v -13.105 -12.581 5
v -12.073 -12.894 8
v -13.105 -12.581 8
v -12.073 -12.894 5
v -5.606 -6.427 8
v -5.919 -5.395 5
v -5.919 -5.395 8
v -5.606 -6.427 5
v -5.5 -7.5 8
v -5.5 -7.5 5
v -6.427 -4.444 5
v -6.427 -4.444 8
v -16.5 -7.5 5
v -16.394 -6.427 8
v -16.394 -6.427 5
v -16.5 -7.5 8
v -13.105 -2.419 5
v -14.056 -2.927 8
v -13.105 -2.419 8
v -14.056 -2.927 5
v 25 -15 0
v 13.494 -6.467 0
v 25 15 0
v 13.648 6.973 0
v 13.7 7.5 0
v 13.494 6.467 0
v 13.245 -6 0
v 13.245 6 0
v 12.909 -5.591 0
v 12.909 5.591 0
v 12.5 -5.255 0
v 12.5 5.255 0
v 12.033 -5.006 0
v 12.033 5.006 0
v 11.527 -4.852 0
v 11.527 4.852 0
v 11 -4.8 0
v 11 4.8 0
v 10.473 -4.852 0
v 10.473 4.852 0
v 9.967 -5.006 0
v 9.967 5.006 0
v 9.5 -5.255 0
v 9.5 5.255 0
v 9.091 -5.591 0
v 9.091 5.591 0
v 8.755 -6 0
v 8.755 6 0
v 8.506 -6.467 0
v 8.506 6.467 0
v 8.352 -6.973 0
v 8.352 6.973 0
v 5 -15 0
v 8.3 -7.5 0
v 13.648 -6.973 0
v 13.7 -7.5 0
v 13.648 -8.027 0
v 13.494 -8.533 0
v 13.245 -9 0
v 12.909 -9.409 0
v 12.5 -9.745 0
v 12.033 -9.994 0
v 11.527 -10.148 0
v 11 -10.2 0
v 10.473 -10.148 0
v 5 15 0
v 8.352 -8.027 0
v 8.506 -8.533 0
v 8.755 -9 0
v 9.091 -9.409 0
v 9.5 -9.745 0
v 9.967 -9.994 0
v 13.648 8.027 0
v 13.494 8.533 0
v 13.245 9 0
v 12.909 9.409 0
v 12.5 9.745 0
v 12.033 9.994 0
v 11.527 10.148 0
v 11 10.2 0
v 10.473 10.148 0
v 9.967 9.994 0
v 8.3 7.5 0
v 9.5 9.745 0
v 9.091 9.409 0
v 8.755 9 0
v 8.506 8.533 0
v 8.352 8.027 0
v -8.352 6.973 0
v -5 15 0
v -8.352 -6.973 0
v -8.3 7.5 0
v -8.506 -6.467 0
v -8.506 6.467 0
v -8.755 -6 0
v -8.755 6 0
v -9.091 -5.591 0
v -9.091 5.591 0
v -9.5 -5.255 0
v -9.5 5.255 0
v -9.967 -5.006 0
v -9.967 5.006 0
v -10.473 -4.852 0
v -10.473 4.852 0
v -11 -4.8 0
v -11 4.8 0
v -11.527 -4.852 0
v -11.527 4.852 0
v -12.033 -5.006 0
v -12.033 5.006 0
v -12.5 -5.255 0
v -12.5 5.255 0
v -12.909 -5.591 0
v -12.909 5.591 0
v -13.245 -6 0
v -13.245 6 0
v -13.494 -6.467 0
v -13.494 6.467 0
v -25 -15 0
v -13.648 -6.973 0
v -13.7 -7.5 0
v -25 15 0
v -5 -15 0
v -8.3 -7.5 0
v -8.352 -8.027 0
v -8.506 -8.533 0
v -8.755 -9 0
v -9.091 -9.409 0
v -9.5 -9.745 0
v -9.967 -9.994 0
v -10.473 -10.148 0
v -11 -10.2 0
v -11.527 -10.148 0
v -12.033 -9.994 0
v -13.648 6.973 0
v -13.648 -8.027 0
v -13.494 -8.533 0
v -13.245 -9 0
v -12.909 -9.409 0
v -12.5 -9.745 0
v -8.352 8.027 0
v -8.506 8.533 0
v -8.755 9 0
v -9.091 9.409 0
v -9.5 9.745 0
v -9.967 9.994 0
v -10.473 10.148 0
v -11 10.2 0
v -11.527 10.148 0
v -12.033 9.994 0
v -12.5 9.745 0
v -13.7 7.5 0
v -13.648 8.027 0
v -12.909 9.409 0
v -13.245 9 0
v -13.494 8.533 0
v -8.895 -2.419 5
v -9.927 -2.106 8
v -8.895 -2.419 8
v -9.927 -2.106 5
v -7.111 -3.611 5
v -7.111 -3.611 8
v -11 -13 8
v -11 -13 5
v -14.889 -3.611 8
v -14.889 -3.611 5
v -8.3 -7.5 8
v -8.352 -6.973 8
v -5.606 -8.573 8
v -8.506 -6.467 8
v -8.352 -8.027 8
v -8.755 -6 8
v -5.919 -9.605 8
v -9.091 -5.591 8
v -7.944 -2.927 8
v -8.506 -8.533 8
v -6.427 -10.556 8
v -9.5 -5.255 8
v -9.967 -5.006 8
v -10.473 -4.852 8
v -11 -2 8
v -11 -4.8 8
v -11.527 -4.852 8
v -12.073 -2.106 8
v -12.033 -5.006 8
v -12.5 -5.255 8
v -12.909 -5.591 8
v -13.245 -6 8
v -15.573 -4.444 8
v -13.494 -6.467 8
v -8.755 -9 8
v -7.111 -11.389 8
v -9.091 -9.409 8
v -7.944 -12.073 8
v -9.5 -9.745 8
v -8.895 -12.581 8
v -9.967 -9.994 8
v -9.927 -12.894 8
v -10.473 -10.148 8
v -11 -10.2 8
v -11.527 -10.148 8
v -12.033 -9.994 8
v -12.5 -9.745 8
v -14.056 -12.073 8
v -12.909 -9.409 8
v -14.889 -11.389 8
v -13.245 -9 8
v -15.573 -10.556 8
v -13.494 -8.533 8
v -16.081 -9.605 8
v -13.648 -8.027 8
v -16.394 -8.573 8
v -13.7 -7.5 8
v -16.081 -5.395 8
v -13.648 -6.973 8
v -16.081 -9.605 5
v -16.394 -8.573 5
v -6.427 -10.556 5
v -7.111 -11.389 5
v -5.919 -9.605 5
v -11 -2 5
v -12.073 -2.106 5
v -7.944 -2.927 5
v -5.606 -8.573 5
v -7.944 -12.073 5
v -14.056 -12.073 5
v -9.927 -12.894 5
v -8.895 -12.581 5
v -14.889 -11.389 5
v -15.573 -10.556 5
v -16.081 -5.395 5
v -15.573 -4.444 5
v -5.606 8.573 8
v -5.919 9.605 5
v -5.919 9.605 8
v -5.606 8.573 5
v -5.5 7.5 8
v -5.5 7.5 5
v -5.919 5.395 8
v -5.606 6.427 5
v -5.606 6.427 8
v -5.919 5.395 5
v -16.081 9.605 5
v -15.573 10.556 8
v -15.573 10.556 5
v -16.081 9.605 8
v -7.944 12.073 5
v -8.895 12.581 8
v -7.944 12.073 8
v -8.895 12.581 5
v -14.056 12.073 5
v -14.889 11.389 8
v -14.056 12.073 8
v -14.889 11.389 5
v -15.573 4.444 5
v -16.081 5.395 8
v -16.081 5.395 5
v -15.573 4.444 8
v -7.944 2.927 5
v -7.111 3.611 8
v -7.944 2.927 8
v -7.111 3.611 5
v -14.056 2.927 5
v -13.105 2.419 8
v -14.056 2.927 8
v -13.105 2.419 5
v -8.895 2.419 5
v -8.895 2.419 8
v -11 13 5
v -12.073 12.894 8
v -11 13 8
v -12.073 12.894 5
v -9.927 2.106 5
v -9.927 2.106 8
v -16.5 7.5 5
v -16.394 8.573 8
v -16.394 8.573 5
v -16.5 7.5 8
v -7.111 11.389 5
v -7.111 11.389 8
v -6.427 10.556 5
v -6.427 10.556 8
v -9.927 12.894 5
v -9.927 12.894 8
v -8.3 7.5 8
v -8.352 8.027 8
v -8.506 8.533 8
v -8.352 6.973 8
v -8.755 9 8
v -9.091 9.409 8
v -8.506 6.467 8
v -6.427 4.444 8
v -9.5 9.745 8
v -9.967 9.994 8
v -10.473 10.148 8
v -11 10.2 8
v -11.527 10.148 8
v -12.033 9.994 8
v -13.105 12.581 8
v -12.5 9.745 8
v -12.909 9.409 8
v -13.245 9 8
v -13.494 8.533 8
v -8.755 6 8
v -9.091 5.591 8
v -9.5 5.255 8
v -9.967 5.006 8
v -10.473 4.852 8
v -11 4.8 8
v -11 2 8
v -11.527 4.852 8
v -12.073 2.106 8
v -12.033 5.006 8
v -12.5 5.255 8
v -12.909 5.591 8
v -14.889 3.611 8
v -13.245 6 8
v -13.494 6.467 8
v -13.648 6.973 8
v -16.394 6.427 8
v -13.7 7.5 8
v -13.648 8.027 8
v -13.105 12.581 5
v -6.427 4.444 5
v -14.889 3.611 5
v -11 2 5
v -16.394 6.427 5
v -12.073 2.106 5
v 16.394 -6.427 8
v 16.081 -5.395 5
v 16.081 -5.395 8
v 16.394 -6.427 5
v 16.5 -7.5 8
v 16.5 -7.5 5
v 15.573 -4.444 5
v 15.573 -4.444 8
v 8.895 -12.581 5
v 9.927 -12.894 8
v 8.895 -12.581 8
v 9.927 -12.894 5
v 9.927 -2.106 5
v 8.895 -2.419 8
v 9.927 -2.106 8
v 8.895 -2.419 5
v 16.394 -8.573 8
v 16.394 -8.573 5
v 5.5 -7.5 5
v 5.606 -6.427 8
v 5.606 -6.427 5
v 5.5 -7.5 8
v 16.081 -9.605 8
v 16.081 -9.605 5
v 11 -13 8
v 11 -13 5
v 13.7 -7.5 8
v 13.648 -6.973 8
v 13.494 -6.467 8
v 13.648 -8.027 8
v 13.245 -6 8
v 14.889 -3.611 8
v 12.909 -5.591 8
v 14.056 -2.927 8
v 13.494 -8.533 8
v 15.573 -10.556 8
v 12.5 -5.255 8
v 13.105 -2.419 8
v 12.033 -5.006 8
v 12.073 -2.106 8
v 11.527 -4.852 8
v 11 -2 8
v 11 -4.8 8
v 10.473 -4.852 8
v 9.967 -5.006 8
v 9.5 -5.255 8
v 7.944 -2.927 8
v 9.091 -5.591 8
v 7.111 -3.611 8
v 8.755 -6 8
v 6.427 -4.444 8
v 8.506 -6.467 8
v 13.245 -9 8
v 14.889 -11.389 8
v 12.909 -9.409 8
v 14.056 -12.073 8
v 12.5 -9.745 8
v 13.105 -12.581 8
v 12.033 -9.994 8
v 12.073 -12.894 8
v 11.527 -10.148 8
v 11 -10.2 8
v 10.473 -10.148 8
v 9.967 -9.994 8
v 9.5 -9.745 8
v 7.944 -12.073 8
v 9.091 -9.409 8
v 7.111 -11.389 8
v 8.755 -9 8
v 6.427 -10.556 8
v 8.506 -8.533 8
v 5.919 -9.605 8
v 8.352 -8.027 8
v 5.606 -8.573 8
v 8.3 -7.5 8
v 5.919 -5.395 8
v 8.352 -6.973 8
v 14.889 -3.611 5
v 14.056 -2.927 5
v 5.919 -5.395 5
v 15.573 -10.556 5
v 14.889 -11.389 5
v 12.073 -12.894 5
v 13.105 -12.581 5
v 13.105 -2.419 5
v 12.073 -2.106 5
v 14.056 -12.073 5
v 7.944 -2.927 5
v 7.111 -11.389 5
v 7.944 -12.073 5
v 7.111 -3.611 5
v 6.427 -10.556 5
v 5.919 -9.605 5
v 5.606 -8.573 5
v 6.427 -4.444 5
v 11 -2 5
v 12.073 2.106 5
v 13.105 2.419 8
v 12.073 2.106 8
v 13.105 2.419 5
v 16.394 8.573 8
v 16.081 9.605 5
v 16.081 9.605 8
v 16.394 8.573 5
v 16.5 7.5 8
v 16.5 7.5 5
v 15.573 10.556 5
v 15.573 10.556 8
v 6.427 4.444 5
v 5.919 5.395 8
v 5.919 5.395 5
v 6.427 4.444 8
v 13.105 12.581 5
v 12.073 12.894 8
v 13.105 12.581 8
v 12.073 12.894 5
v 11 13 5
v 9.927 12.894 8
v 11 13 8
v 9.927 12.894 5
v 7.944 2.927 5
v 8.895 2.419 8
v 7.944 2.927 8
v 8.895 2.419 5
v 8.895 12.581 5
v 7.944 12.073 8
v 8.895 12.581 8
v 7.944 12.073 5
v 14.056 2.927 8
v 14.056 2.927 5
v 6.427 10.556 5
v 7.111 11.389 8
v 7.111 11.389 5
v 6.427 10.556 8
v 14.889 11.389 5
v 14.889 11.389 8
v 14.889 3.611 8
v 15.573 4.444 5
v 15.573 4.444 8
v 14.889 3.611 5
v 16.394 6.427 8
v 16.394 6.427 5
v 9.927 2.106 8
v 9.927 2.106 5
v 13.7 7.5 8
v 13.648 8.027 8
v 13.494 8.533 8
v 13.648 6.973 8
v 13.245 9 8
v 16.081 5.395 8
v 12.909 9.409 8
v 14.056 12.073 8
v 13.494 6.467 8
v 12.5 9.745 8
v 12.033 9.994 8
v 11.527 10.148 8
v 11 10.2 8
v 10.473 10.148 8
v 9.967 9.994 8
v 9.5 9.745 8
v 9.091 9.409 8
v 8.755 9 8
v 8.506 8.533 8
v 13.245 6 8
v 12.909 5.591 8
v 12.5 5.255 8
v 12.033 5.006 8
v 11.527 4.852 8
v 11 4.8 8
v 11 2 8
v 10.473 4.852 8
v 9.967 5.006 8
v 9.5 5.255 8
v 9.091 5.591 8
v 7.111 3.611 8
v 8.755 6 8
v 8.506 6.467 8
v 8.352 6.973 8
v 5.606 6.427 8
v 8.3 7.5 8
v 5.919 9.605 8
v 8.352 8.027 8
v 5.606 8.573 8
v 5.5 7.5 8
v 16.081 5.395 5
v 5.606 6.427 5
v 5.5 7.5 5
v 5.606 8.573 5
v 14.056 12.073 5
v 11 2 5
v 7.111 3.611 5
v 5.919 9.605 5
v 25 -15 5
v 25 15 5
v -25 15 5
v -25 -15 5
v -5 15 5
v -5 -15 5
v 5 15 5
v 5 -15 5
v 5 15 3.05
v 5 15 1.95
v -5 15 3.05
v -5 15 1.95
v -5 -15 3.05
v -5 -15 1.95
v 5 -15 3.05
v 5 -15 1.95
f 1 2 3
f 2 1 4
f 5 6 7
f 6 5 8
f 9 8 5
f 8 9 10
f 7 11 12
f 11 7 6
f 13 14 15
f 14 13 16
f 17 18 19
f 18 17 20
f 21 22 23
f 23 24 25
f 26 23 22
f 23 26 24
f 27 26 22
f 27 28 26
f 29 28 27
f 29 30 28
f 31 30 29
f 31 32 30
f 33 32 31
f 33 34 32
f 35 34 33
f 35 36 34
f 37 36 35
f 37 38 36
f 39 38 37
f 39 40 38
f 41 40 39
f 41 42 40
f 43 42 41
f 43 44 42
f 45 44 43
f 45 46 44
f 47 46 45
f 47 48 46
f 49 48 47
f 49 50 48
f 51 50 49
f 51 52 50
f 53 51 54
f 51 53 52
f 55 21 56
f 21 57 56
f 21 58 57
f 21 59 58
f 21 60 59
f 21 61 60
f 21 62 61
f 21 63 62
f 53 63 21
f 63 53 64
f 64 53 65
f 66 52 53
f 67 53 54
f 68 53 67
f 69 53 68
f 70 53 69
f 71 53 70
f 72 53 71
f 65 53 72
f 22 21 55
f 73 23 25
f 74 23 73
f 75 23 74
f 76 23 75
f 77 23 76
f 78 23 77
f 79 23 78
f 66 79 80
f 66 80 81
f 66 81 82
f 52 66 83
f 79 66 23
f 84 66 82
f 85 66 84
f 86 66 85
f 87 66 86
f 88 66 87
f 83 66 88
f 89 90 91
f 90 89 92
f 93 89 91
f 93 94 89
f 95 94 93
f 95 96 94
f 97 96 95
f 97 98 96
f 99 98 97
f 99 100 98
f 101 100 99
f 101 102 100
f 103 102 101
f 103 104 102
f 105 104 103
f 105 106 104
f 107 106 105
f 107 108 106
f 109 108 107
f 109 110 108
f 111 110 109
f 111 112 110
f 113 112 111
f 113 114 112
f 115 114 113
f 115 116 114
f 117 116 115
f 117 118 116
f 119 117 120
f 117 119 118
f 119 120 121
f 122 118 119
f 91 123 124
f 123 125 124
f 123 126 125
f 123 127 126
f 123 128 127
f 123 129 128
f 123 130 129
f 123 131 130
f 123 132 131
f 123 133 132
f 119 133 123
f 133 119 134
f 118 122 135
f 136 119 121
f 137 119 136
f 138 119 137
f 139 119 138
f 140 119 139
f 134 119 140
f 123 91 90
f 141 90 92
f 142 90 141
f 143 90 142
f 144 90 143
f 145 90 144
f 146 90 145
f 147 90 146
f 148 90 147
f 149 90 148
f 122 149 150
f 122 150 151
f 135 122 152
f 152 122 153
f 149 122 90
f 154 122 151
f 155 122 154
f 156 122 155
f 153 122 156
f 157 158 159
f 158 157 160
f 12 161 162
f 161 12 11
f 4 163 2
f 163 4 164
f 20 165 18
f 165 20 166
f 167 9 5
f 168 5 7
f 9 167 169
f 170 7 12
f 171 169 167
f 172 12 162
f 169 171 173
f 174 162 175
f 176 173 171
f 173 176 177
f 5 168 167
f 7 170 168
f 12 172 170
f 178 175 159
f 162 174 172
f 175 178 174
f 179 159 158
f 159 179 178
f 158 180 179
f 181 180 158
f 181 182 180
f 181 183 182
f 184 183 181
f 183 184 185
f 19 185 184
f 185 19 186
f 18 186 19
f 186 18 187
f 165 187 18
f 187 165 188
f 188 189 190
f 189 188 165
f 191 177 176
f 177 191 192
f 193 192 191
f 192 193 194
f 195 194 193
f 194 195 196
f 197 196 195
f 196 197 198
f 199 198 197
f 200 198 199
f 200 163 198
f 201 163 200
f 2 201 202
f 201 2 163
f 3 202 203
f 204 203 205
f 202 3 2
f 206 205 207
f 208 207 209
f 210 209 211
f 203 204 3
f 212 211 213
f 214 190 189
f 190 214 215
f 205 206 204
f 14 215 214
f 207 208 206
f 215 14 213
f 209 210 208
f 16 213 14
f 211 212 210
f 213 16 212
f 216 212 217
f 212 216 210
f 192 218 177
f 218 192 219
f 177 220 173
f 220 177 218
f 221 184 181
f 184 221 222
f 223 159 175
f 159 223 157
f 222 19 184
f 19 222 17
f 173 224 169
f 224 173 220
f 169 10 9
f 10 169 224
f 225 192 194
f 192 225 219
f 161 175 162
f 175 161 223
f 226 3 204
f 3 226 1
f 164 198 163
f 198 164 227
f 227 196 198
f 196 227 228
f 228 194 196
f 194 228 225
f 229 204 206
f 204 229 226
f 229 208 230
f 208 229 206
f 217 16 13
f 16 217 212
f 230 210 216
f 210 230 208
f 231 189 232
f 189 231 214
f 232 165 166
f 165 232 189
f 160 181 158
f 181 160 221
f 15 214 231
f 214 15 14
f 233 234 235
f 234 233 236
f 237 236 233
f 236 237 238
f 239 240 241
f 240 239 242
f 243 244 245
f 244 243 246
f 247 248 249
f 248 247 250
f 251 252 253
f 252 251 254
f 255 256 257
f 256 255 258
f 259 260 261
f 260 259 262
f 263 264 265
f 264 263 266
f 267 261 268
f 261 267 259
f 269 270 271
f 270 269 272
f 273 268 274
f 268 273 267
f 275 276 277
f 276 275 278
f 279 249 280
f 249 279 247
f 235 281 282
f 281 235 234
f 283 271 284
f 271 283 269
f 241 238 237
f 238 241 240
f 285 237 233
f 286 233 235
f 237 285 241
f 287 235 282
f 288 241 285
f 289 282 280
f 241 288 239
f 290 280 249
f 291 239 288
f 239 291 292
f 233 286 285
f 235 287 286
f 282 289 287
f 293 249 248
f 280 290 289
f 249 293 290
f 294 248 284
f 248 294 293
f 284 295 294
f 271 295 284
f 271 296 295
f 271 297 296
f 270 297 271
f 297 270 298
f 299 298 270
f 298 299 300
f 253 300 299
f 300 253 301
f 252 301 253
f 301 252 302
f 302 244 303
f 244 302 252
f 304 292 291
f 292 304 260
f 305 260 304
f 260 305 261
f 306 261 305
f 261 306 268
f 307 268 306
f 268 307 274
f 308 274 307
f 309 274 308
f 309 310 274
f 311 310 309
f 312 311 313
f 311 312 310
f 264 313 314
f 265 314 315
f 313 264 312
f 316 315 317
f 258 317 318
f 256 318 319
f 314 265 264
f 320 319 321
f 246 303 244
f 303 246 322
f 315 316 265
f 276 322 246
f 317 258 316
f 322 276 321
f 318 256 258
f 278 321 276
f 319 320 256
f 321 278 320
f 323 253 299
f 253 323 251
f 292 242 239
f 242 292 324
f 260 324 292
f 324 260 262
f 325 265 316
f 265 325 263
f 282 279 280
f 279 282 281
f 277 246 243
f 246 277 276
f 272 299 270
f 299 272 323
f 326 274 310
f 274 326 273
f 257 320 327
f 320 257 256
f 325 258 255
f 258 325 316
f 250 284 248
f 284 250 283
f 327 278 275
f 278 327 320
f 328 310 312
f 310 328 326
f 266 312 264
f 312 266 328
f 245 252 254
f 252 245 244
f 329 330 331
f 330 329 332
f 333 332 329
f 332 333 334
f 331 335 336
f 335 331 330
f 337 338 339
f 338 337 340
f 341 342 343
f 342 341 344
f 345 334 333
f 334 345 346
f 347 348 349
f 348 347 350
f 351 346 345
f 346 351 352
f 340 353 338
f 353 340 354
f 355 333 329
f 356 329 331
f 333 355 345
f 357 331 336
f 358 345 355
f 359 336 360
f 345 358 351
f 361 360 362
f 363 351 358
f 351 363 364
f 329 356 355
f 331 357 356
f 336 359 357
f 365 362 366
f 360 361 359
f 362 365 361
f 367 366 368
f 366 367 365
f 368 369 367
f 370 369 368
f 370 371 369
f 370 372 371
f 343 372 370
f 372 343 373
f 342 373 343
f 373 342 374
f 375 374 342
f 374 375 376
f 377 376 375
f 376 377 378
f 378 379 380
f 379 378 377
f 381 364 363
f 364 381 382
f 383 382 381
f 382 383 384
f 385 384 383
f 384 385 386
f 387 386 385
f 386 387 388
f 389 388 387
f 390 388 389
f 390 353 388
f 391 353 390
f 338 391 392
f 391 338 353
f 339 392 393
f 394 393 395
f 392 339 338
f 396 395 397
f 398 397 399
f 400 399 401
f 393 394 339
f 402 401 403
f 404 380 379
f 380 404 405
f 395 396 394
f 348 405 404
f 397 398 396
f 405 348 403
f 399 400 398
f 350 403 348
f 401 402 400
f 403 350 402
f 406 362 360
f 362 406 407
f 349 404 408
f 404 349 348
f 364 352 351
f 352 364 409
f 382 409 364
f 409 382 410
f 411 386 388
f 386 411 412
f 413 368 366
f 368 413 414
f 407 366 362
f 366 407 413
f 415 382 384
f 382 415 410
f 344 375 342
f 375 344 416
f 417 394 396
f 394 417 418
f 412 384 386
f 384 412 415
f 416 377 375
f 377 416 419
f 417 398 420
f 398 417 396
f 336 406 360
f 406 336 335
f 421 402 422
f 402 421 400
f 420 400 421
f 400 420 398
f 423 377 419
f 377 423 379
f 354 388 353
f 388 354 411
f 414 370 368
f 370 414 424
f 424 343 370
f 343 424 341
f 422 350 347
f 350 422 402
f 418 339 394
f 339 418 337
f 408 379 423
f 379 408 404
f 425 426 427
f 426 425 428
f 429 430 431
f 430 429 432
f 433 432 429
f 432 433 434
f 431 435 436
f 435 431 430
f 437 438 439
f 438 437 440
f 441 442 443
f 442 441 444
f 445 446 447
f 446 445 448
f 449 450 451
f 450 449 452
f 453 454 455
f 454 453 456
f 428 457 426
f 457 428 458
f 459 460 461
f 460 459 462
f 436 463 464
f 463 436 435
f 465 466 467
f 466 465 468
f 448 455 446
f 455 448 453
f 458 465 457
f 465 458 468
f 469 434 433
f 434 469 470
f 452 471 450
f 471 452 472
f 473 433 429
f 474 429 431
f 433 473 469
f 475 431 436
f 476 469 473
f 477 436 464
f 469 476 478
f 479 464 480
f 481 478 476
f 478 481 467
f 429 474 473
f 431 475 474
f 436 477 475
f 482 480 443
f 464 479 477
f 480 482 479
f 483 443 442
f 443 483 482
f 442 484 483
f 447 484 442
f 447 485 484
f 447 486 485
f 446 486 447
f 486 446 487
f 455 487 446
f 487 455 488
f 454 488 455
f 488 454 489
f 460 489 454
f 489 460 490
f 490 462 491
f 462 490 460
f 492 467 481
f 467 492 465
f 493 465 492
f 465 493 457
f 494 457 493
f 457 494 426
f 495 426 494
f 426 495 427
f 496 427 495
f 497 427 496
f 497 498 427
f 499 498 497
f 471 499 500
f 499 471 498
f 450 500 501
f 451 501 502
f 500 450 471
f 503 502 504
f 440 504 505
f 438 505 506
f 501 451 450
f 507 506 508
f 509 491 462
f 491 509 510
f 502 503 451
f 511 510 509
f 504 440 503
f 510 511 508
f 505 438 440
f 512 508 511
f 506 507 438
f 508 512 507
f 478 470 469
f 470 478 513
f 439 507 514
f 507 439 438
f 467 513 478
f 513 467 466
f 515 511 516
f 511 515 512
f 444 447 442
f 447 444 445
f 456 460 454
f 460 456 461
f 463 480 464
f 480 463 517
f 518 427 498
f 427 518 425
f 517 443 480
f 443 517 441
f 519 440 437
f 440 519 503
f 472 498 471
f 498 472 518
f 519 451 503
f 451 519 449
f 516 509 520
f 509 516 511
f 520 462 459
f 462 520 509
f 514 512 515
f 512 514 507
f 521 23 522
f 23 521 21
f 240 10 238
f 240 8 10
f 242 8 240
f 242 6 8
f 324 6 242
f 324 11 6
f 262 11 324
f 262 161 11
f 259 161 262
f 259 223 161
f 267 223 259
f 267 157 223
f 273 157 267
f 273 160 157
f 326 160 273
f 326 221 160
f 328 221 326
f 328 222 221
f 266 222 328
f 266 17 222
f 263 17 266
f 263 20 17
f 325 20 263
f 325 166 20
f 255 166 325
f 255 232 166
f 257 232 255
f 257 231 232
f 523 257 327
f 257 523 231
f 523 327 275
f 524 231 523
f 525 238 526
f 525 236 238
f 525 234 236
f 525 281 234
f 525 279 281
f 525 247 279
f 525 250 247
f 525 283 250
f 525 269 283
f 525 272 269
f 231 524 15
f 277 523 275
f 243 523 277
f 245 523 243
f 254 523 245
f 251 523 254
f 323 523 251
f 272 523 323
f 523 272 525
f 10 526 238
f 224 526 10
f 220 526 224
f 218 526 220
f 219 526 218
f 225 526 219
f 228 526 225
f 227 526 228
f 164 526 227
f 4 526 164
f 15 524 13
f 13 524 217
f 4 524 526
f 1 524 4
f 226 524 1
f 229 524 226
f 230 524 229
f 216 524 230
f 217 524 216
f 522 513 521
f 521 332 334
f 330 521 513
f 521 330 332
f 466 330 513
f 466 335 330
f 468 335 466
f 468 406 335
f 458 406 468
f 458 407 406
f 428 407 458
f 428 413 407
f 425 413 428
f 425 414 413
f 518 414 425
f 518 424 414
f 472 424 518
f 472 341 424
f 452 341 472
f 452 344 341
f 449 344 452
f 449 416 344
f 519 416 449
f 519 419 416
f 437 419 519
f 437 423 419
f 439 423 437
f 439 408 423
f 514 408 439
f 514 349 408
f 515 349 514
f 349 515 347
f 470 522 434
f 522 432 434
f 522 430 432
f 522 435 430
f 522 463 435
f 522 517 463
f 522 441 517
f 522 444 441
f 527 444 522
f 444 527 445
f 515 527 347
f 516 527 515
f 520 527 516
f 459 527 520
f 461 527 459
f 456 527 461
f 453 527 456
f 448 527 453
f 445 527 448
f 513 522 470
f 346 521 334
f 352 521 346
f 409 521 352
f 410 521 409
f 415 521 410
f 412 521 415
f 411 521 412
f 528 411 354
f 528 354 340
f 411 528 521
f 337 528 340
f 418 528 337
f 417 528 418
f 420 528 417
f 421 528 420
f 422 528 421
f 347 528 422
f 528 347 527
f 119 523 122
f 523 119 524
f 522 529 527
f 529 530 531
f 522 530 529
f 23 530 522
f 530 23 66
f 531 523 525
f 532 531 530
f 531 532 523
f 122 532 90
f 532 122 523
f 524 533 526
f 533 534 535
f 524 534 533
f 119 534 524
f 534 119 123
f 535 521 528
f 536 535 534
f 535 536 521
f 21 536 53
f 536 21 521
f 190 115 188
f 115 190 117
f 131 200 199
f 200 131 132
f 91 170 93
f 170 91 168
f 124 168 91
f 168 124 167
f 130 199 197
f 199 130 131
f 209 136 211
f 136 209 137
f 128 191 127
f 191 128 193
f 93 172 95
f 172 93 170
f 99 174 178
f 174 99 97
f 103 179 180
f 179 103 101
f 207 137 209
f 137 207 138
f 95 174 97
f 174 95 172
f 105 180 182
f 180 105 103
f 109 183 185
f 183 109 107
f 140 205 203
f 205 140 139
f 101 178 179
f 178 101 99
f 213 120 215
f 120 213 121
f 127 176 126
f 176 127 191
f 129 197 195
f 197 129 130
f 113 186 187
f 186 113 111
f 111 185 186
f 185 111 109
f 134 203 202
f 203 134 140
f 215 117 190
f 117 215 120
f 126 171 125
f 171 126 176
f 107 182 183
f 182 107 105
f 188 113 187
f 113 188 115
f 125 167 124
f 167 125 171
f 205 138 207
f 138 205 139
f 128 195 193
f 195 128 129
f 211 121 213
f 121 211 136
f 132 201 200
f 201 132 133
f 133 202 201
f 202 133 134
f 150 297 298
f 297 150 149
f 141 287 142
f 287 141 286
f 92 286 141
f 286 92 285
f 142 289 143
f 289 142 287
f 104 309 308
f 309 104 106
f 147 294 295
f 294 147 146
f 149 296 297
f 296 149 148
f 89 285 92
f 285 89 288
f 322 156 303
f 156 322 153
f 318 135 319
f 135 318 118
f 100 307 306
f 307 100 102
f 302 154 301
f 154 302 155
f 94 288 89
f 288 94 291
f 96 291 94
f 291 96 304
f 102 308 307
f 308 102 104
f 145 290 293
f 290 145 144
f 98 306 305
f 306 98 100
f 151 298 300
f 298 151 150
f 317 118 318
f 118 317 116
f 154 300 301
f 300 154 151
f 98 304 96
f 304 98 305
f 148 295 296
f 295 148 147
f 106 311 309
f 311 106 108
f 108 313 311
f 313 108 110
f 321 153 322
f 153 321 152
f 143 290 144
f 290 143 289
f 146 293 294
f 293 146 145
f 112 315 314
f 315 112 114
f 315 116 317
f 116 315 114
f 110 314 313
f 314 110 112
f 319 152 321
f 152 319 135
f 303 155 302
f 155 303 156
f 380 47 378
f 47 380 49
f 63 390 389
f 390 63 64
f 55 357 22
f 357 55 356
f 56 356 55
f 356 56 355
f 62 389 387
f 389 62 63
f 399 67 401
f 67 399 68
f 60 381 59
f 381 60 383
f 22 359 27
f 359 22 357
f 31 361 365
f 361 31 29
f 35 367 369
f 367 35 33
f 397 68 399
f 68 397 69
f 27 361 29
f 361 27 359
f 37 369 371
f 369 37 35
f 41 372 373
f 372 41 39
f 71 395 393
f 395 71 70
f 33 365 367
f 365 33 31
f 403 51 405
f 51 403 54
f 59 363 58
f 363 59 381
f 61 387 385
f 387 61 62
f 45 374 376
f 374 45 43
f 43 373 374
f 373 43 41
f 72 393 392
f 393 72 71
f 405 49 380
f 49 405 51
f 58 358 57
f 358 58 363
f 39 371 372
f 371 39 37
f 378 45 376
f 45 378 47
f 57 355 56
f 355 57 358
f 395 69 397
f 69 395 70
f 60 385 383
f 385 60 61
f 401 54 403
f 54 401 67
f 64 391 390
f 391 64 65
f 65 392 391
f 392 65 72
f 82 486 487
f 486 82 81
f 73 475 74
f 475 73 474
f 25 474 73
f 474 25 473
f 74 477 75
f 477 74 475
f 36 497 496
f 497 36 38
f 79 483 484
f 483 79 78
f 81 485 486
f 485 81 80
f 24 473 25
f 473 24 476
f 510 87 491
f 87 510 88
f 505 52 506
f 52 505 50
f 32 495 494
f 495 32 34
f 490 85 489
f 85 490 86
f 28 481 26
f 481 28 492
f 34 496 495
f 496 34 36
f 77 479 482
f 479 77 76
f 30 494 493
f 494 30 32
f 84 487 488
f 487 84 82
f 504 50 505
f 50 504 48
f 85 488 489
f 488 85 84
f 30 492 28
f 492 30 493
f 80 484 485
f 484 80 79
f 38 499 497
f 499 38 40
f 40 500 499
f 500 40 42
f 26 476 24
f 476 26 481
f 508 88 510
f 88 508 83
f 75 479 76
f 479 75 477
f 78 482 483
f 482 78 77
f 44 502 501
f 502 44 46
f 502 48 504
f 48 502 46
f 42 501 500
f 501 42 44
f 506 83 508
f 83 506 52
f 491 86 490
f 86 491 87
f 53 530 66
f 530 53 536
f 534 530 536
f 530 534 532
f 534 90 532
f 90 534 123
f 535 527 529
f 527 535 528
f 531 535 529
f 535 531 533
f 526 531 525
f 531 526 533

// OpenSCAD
$fn = 32;

// ----------------------------------------------------------------------
// Living hinge: 50 x 30 mm plates, 1.1 mm flexible web
// ----------------------------------------------------------------------

// --- parameters (mm) ---
plate_len = 20;           // plate length outside the web
plate_w = 30;             // plate width
thick = 5;                // plate thickness
web_half = 5;             // half width of the flex band
web_t = 1.1;              // flexible web thickness
web_z = 1.95;             // web position inside the thickness
boss_d = 11;              // screw boss diameter
boss_h = 8;               // screw boss height
boss_x = 11;              // screw boss distance from the web
screw_d = 5.4;            // screw hole

difference() {
  union() {
    /* one flat strip, later thinned at the middle */
    translate([-25, -15, 0]) cube([50, 30, 5]);
    /* screw bosses, sunk 0.5 mm into the plates */
    for (sx = [-11, 11]) {
      for (sy = [-7.5, 7.5]) {
        translate([sx, sy, 0]) cylinder(h = boss_h, d = boss_d);
      }
    }
  }
  /* channel from below: leaves the web on top of it */
  translate([-5, -17.5, -2.5]) cube([10, 35, 4.45]);
  /* channel from above: thins the web down to web_t */
  translate([-5, -17.5, 3.05]) cube([10, 35, 4.45]);
  /* screw holes through the bosses */
  for (sx = [-11, 11]) {
    for (sy = [-7.5, 7.5]) {
      translate([sx, sy, -2.5]) cylinder(h = boss_h + 5, d = screw_d);
    }
  }
}
